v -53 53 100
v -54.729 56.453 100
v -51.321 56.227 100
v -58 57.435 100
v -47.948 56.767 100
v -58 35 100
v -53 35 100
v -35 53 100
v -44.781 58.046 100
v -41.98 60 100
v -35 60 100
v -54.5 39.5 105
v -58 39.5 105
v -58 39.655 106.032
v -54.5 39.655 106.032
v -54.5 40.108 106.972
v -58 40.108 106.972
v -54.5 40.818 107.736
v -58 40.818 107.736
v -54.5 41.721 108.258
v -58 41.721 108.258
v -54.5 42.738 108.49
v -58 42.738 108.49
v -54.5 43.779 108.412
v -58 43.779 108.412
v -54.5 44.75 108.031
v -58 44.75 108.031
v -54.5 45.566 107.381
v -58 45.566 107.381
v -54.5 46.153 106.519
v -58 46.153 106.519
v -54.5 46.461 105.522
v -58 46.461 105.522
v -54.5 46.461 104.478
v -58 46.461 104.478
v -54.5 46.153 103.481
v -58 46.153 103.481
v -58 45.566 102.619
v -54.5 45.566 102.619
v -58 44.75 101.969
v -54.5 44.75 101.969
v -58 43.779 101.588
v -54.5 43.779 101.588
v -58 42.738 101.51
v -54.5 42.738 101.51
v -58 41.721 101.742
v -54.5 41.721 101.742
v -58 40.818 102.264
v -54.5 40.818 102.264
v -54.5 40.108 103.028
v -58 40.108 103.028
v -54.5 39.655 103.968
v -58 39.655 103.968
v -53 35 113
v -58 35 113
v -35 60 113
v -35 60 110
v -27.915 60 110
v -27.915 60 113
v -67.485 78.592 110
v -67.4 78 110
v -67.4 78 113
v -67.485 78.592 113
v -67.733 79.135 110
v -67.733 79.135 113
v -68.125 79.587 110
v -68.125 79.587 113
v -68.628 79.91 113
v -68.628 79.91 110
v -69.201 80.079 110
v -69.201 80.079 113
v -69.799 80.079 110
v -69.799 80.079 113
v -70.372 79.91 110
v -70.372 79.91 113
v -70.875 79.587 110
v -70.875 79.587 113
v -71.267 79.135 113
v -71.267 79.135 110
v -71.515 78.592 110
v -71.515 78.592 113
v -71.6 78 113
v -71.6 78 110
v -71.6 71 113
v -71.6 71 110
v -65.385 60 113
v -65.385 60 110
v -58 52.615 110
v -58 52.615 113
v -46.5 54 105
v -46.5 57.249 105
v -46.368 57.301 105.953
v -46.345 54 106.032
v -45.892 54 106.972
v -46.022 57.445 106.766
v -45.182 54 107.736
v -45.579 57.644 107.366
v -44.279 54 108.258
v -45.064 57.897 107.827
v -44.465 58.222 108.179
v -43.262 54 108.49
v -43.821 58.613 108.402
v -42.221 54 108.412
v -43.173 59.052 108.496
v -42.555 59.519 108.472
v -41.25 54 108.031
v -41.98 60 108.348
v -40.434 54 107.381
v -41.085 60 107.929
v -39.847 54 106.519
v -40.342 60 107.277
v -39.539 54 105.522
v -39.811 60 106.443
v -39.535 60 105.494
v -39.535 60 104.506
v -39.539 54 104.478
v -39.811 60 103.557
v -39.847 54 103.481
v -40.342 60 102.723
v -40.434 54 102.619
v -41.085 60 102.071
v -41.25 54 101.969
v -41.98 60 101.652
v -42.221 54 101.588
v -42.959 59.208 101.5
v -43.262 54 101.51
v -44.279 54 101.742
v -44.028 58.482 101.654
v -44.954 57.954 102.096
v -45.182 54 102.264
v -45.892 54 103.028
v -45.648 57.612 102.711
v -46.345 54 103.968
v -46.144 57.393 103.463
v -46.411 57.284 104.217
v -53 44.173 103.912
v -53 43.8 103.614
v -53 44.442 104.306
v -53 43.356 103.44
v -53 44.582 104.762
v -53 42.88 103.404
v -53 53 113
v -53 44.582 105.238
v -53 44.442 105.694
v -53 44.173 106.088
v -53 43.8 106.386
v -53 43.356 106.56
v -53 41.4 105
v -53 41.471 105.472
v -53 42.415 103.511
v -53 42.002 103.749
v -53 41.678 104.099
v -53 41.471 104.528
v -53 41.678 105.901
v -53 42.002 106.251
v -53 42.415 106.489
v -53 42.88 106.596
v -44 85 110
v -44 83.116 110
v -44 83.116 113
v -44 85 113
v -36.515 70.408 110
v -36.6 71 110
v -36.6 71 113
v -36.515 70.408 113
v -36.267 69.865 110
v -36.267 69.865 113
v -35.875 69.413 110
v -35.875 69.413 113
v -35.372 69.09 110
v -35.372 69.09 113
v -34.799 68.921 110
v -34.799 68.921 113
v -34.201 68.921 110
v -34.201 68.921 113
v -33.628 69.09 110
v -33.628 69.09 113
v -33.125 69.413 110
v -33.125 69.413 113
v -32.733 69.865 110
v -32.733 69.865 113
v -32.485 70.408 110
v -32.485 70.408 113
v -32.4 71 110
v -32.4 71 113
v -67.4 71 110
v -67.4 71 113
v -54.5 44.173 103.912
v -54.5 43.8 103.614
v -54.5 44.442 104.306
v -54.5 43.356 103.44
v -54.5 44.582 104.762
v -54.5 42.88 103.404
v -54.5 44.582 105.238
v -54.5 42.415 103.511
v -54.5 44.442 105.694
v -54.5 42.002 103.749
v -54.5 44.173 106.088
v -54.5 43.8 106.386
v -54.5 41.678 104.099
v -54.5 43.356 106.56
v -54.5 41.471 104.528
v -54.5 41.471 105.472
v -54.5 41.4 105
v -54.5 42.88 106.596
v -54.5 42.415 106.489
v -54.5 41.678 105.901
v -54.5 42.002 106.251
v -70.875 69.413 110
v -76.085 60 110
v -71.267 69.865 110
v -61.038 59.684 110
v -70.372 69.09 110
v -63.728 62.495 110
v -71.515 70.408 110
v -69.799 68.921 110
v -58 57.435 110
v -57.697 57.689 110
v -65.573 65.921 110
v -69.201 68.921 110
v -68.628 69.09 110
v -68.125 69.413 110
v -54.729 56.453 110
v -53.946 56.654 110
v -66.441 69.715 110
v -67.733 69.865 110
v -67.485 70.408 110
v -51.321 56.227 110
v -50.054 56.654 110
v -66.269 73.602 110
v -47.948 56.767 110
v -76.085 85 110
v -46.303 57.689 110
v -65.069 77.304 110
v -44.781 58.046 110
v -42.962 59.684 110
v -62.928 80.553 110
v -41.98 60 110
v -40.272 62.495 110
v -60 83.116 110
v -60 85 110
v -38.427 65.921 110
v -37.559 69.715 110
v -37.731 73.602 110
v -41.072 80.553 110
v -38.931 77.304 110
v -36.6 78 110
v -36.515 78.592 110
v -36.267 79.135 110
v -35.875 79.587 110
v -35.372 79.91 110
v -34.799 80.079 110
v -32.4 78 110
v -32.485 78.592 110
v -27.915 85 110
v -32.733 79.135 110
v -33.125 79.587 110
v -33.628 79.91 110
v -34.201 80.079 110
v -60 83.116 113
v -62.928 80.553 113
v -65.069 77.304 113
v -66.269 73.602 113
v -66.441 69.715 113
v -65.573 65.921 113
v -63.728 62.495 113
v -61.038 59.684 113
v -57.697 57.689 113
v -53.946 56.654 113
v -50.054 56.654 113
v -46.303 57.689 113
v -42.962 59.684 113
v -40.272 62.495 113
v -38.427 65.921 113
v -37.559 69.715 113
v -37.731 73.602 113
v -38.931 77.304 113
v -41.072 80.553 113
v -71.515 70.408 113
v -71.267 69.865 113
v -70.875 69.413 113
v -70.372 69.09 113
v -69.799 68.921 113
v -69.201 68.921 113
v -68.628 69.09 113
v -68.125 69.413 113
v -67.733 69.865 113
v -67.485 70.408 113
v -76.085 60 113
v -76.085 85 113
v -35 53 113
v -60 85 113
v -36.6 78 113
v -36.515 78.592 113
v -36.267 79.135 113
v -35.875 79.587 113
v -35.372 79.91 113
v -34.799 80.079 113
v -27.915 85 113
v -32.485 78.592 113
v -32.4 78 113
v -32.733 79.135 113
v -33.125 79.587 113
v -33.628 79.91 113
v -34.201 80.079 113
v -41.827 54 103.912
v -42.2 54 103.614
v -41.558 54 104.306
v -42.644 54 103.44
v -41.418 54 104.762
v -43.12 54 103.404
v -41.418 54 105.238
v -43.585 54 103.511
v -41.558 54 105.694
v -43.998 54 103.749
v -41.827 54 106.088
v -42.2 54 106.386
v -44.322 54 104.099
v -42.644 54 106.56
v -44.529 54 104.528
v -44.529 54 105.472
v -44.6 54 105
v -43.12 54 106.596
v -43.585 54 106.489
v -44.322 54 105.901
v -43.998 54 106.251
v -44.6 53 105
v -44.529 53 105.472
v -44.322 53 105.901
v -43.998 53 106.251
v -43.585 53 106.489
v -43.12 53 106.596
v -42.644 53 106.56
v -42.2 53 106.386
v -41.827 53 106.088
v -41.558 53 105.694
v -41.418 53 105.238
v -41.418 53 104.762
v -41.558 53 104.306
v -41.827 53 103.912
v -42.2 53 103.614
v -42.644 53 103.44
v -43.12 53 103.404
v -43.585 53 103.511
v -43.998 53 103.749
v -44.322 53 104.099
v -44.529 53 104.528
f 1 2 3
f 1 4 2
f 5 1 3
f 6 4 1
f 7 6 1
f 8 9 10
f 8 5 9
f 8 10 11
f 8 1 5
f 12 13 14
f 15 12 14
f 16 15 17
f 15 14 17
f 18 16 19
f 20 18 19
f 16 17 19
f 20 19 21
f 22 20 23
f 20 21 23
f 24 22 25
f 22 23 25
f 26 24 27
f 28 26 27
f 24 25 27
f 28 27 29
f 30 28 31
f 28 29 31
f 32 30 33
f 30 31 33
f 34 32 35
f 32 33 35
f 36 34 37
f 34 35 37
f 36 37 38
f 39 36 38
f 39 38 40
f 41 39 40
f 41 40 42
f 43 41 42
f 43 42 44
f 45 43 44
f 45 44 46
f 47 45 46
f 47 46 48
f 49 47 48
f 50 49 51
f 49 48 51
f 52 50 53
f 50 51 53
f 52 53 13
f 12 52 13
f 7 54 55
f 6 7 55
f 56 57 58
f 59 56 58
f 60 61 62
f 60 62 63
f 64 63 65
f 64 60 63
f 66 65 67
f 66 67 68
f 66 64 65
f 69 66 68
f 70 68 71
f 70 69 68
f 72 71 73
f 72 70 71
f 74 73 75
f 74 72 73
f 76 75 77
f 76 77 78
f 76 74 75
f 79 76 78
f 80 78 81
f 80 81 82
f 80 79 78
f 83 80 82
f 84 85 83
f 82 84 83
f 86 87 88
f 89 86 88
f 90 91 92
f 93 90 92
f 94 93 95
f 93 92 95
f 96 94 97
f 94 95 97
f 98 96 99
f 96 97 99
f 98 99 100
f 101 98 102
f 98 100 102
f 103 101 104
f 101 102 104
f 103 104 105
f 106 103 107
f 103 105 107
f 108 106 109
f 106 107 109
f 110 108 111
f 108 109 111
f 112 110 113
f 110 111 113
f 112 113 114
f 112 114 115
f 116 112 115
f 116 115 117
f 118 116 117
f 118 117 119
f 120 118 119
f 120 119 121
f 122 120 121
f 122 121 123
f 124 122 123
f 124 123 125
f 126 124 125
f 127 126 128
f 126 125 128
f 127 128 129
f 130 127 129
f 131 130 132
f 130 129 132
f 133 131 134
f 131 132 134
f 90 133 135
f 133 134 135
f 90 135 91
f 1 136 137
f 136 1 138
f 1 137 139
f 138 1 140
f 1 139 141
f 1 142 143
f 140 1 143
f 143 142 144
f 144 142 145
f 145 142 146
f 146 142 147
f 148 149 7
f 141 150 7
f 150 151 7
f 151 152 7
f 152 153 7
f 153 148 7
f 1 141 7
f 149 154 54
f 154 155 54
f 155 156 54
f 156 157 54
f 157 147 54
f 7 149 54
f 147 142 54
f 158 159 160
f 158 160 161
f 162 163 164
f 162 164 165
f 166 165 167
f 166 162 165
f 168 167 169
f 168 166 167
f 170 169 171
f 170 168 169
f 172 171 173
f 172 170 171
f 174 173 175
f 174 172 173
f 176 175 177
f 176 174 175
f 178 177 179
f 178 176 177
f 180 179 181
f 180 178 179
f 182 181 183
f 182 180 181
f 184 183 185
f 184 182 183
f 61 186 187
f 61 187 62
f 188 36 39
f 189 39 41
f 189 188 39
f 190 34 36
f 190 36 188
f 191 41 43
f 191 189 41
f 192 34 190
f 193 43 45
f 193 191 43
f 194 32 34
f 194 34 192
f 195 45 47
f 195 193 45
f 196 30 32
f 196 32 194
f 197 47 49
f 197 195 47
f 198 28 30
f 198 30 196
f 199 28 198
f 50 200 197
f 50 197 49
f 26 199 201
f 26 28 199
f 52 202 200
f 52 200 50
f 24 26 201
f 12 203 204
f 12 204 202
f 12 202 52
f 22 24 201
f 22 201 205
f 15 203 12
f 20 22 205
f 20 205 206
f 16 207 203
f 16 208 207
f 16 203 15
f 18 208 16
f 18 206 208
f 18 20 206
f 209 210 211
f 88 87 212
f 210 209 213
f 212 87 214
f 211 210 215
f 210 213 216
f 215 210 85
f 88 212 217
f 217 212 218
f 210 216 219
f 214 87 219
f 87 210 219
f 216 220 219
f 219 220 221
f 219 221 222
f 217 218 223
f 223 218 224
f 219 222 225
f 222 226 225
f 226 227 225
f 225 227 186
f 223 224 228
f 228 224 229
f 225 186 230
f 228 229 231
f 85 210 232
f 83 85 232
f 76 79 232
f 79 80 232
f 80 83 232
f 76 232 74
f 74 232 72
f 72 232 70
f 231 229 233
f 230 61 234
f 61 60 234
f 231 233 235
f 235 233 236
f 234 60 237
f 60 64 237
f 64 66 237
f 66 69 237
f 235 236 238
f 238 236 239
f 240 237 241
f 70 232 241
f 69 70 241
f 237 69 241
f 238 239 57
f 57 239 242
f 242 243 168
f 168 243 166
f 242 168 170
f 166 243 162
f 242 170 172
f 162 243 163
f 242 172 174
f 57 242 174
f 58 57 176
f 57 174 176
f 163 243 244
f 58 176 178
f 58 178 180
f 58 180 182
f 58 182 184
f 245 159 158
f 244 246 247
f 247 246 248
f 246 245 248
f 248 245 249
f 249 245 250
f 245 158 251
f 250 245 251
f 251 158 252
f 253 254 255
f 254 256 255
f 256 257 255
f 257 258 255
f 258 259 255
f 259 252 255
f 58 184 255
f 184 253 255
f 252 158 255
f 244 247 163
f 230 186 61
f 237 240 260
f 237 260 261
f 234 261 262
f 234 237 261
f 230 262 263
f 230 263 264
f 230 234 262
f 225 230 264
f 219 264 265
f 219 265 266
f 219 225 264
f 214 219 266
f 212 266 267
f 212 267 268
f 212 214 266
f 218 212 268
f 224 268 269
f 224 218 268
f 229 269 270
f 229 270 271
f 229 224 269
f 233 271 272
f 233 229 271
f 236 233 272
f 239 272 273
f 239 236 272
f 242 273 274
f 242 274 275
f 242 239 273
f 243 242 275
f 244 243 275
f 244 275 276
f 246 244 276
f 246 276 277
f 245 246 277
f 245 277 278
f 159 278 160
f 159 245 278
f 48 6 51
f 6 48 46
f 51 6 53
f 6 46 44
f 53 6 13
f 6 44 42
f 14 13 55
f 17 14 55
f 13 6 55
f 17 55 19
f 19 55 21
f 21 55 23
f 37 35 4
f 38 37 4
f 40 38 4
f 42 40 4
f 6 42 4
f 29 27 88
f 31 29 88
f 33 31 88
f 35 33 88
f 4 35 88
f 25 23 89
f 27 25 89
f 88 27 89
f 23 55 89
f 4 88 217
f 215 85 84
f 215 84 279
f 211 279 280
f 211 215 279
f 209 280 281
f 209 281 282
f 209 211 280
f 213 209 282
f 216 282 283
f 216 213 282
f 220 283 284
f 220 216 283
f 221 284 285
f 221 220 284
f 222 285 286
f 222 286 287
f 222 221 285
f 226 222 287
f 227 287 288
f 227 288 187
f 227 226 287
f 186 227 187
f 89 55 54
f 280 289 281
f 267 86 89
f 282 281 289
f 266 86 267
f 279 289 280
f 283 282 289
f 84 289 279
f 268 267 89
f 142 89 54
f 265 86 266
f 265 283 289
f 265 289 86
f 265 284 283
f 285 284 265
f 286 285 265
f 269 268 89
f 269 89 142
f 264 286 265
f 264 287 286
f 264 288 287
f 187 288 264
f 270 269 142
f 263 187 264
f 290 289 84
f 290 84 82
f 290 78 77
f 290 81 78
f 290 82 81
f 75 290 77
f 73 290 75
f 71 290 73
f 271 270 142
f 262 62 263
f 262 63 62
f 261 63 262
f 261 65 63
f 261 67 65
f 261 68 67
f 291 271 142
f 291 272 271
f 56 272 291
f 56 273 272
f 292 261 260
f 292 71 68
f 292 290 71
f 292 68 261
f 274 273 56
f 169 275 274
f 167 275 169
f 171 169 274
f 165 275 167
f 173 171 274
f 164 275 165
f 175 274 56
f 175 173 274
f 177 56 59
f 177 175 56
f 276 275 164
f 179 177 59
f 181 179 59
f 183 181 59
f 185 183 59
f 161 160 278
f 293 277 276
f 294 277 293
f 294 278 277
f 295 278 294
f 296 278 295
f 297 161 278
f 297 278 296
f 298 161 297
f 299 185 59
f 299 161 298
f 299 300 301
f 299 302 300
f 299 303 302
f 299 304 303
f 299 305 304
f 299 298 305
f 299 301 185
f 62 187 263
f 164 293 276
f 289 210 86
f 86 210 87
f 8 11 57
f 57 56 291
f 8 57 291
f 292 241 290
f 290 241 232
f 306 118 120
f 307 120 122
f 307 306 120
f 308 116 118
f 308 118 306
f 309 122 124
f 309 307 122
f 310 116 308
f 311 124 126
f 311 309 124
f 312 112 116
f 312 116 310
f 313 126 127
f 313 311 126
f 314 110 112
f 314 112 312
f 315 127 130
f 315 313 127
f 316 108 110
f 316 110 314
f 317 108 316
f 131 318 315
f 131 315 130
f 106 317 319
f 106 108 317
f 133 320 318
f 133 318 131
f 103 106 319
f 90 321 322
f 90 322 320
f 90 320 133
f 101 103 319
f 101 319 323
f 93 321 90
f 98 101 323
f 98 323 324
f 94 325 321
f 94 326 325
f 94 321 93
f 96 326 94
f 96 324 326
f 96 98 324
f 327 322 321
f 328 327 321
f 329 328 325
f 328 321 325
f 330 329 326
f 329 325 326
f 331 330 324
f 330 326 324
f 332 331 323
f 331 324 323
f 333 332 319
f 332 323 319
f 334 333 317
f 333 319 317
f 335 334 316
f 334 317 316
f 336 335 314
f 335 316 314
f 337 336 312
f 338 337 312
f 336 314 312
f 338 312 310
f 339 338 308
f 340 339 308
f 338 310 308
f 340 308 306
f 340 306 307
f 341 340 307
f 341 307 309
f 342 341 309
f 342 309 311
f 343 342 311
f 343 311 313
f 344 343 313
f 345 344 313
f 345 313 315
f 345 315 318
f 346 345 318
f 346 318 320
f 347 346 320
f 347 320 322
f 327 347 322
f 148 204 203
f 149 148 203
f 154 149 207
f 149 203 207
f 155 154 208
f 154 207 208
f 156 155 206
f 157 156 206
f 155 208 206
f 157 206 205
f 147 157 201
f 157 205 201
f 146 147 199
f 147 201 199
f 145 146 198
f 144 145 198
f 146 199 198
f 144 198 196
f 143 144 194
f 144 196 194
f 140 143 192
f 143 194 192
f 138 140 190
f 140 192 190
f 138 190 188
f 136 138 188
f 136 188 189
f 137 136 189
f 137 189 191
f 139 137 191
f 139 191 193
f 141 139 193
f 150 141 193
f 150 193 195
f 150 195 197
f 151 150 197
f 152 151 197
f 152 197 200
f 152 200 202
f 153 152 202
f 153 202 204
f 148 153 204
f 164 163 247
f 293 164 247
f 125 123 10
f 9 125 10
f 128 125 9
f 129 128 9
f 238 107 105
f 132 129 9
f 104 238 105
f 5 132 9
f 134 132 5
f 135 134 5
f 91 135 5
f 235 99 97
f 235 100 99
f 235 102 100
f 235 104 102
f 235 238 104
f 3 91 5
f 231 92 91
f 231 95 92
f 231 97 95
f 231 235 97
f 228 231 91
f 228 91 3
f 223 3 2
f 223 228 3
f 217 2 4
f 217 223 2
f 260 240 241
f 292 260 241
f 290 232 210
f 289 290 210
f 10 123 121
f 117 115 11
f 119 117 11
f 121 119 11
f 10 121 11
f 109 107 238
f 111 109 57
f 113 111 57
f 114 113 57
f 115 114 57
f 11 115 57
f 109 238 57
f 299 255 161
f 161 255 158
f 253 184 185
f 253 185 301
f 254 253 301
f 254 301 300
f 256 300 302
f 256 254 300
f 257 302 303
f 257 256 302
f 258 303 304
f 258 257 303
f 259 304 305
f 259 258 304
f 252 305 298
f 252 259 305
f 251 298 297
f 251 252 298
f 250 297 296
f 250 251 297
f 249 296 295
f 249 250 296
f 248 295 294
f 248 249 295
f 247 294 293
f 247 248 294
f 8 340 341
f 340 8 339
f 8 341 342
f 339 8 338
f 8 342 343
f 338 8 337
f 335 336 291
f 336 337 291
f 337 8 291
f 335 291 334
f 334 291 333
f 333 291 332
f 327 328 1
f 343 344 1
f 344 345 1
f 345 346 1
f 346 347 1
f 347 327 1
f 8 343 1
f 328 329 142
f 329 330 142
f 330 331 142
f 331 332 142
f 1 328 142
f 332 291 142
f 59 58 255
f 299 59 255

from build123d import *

# Parameters (mm, degrees)
PAD035_DEPTH    = 3
PAD036_DEPTH    = 10
SKETCH093_R     = 1.6
POCKET056_DEPTH = 5
SKETCH094_R     = 3.5
POCKET057_DEPTH = 3.5
SKETCH095_R     = 1.6
POCKET058_DEPTH = 10
SKETCH096_R     = 3.5
POCKET059_DEPTH = 6


with BuildPart() as part:
    # Sketch091 → Pad035 (new body)
    with BuildSketch(Plane.XY):
        with BuildLine():
            Line((-53, -7), (-35, -7))
            Line((-35, -7), (-35, 0))
            Line((-35, 0), (-27.91459, 0))
            Line((-27.91459, 0), (-27.91459, 25))
            Line((-27.91459, 25), (-44, 25))
            Line((-44, 23.115973), (-44, 25))
            ThreePointArc((-60, 23.115973), (-52, -3.477413), (-44, 23.115973))
            Line((-60, 23.115973), (-60, 25))
            Line((-60, 25), (-76.08541, 25))
            Line((-76.08541, 25), (-76.08541, 0))
            Line((-76.08541, 0), (-65.384759, 0))
            Line((-65.384759, 0), (-58, -7.384759))
            Line((-58, -7.384759), (-58, -25))
            Line((-58, -25), (-53, -25))
            Line((-53, -25), (-53, -7))
        make_face()
        with BuildLine():
            ThreePointArc((-71.6, 11), (-69.5, 8.9), (-67.4, 11))
            Line((-67.4, 11), (-67.4, 18))
            ThreePointArc((-67.4, 18), (-69.5, 20.1), (-71.6, 18))
            Line((-71.6, 11), (-71.6, 18))
        make_face(mode=Mode.SUBTRACT)
        with BuildLine():
            ThreePointArc((-36.6, 11), (-34.5, 8.9), (-32.4, 11))
            Line((-32.4, 11), (-32.4, 18))
            ThreePointArc((-32.4, 18), (-34.5, 20.1), (-36.6, 18))
            Line((-36.6, 11), (-36.6, 18))
        make_face(mode=Mode.SUBTRACT)
    extrude(amount=PAD035_DEPTH)

    # Sketch092 (on Face24 of Pad035) → Pad036 (join)
    with BuildSketch(Plane(origin=(0, 0, 0), x_dir=(1, 0, 0), z_dir=(0, 0, -1))):
        with BuildLine():
            Line((-53, 25), (-58, 25))
            Line((-58, 25), (-58, 7.384759))
            Line((-58, 7.384759), (-58, 2.564759))
            ThreePointArc((-41.98, 0), (-49.619239, 3.598228), (-58, 2.564759))
            Line((-41.98, 0), (-35, 0))
            Line((-35, 0), (-35, 7))
            Line((-35, 7), (-53, 7))
            Line((-53, 7), (-53, 25))
        make_face()
    extrude(amount=PAD036_DEPTH)

    # Sketch093 (on Face31 of Pad036) → Pocket056 (cut)
    with BuildSketch(Plane(origin=(-58, 0, 0), x_dir=(0, -1, 0), z_dir=(-1, 0, 0))):
        with Locations((17, -5)):
            Circle(SKETCH093_R)
    extrude(amount=-POCKET056_DEPTH, mode=Mode.SUBTRACT)

    # Sketch094 (on Face31 of Pocket056) → Pocket057 (cut)
    with BuildSketch(Plane(origin=(-58, 0, 0), x_dir=(0, -1, 0), z_dir=(-1, 0, 0))):
        with Locations((17, -5)):
            Circle(SKETCH094_R)
    extrude(amount=-POCKET057_DEPTH, mode=Mode.SUBTRACT)

    # Sketch095 (on Face11 of Pocket057) → Pocket058 (cut)
    with BuildSketch(Plane(origin=(0, 0, 0), x_dir=(-1, 0, 0), z_dir=(0, 1, 0))):
        with Locations((43, -5)):
            Circle(SKETCH095_R)
    extrude(amount=-POCKET058_DEPTH, mode=Mode.SUBTRACT)

    # Sketch096 (on Face11 of Pocket058) → Pocket059 (cut)
    with BuildSketch(Plane(origin=(0, 0, 0), x_dir=(-1, 0, 0), z_dir=(0, 1, 0))):
        with Locations((43, -5)):
            Circle(SKETCH096_R)
    extrude(amount=-POCKET059_DEPTH, mode=Mode.SUBTRACT)


with BuildPart() as part_1:
    # Body013 placement: moved
    add(part.part.moved(Location((0, 60, 110))))


solid = part_1.part
